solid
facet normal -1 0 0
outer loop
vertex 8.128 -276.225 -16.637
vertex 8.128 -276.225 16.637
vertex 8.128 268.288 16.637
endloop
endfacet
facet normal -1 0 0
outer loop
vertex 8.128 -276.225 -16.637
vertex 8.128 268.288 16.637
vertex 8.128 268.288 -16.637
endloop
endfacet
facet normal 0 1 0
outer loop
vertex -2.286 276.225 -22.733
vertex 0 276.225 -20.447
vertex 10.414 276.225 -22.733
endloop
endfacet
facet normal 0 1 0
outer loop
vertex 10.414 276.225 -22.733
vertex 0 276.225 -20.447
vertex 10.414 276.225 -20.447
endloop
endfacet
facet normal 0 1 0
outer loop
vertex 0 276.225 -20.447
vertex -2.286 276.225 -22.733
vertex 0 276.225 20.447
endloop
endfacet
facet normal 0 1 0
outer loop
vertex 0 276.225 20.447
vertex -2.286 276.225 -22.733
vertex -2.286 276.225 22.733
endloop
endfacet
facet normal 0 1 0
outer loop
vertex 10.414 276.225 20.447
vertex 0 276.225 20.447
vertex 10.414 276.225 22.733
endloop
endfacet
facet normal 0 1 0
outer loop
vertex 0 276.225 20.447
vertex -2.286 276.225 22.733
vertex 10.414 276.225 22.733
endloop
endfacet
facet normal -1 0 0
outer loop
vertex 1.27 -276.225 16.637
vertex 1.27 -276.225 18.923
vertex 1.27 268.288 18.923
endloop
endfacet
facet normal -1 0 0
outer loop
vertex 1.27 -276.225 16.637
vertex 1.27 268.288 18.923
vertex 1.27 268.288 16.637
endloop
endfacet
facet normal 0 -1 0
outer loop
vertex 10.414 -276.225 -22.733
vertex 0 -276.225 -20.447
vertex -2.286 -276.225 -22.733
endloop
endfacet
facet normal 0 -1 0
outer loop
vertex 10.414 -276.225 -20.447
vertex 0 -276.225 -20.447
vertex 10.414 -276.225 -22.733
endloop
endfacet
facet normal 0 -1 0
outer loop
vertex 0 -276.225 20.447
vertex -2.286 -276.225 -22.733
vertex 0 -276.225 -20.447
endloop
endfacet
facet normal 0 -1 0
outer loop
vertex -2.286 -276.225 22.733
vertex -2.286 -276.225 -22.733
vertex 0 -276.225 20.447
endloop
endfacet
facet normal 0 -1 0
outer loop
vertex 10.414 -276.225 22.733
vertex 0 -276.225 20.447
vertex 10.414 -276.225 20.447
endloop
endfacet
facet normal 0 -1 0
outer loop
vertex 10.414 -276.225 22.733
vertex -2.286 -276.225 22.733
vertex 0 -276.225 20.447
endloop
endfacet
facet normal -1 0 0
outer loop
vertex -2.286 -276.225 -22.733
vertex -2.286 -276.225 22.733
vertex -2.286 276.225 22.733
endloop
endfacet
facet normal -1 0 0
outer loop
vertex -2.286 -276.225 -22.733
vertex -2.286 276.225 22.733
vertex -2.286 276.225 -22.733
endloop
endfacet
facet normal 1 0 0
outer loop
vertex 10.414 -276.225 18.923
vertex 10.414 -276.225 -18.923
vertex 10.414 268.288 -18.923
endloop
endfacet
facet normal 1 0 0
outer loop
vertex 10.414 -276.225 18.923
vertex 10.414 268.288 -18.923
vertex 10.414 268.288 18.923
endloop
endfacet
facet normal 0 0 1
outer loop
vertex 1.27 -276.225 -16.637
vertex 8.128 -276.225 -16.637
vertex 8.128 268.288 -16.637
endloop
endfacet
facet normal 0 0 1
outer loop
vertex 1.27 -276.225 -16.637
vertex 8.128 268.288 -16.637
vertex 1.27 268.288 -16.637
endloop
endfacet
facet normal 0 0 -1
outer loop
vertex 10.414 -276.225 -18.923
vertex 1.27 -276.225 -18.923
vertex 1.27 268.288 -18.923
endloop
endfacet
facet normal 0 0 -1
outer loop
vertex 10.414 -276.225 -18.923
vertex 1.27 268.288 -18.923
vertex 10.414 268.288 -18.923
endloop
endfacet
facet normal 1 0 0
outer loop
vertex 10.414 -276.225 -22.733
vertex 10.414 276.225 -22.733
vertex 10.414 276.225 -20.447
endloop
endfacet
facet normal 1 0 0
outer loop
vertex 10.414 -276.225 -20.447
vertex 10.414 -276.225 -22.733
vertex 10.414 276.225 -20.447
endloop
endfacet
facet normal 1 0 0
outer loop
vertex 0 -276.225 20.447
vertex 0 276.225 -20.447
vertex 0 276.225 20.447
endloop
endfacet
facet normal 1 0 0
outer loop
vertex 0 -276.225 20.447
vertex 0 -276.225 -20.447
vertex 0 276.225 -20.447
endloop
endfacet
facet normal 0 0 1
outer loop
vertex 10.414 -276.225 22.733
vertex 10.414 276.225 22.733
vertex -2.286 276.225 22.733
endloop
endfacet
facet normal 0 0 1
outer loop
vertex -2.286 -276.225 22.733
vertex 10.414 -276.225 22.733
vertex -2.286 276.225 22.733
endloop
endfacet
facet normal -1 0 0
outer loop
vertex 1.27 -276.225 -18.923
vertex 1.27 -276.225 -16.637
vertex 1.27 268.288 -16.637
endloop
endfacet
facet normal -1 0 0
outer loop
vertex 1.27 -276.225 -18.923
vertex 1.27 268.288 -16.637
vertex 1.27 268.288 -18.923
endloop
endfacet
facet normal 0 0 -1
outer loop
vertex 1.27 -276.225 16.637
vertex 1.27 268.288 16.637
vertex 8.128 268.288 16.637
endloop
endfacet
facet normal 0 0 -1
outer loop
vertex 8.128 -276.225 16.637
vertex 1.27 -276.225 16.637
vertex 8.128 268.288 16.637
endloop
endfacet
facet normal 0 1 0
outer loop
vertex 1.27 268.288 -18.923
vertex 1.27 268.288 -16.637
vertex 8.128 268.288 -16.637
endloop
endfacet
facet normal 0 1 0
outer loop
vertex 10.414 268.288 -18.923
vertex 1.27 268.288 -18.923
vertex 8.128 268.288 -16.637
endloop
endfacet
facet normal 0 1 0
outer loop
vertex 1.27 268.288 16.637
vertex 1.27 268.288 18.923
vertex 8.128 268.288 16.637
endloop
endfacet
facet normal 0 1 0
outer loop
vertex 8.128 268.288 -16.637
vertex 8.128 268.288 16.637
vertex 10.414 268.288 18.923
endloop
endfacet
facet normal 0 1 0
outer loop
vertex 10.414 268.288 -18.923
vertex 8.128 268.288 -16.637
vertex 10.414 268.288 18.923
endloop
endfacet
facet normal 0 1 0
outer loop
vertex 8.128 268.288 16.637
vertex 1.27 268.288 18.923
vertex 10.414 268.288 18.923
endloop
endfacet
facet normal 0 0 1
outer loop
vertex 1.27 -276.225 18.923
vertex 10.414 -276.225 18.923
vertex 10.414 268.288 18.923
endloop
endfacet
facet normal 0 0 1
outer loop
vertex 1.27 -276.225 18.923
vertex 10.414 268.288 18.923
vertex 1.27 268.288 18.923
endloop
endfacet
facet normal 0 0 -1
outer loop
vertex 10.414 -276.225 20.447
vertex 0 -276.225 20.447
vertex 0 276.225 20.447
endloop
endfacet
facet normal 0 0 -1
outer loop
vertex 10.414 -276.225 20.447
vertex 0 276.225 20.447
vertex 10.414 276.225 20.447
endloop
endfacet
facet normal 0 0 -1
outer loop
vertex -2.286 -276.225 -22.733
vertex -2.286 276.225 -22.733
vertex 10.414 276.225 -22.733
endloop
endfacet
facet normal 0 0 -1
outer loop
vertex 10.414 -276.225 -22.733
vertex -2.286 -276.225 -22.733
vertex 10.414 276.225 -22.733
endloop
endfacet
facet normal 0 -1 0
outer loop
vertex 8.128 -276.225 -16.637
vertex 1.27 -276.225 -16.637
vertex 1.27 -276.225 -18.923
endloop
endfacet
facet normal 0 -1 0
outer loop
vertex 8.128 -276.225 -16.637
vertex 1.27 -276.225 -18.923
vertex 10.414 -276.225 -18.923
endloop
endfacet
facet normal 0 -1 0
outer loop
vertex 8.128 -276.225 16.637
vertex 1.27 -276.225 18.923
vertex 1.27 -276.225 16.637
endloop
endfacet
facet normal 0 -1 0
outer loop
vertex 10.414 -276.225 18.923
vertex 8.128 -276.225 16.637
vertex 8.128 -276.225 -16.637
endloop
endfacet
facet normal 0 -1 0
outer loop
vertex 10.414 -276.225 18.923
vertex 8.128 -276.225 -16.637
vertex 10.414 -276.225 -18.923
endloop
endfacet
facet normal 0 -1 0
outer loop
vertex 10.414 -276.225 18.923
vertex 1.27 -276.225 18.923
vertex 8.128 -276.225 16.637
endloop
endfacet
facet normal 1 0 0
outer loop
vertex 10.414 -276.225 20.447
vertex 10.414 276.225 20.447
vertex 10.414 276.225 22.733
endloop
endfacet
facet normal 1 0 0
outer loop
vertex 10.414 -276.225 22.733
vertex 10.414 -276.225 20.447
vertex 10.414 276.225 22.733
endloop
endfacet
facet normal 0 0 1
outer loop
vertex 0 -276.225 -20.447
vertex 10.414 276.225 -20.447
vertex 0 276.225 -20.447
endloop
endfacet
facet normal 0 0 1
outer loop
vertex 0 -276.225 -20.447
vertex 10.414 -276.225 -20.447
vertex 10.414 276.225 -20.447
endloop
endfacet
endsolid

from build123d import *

# Parameters (mm, degrees)
F1_DEPTH = 276.225
F3_DEPTH = 544.5125


with BuildPart() as f1:
    # F0 (on Front) → F1 (new body, symmetric)
    with BuildSketch(Plane.XZ):
        Polygon((0, -20.447), (0, 20.447), (10.414, 20.447), (10.414, 22.733), (-2.286, 22.733), (-2.286, -22.733), (10.414, -22.733), (10.414, -20.447), align=None)
    extrude(amount=F1_DEPTH, both=True)


with BuildPart() as f3:
    # F2 (on face) → F3 (new body)
    with BuildSketch(Plane.XZ.offset(276.225)):
        Polygon((10.414, 18.923), (1.27, 18.923), (1.27, 16.637), (8.128, 16.637), (8.128, -16.637), (1.27, -16.637), (1.27, -18.923), (10.414, -18.923), align=None)
    extrude(amount=-F3_DEPTH)


solid = Compound([f1.part, f3.part])
